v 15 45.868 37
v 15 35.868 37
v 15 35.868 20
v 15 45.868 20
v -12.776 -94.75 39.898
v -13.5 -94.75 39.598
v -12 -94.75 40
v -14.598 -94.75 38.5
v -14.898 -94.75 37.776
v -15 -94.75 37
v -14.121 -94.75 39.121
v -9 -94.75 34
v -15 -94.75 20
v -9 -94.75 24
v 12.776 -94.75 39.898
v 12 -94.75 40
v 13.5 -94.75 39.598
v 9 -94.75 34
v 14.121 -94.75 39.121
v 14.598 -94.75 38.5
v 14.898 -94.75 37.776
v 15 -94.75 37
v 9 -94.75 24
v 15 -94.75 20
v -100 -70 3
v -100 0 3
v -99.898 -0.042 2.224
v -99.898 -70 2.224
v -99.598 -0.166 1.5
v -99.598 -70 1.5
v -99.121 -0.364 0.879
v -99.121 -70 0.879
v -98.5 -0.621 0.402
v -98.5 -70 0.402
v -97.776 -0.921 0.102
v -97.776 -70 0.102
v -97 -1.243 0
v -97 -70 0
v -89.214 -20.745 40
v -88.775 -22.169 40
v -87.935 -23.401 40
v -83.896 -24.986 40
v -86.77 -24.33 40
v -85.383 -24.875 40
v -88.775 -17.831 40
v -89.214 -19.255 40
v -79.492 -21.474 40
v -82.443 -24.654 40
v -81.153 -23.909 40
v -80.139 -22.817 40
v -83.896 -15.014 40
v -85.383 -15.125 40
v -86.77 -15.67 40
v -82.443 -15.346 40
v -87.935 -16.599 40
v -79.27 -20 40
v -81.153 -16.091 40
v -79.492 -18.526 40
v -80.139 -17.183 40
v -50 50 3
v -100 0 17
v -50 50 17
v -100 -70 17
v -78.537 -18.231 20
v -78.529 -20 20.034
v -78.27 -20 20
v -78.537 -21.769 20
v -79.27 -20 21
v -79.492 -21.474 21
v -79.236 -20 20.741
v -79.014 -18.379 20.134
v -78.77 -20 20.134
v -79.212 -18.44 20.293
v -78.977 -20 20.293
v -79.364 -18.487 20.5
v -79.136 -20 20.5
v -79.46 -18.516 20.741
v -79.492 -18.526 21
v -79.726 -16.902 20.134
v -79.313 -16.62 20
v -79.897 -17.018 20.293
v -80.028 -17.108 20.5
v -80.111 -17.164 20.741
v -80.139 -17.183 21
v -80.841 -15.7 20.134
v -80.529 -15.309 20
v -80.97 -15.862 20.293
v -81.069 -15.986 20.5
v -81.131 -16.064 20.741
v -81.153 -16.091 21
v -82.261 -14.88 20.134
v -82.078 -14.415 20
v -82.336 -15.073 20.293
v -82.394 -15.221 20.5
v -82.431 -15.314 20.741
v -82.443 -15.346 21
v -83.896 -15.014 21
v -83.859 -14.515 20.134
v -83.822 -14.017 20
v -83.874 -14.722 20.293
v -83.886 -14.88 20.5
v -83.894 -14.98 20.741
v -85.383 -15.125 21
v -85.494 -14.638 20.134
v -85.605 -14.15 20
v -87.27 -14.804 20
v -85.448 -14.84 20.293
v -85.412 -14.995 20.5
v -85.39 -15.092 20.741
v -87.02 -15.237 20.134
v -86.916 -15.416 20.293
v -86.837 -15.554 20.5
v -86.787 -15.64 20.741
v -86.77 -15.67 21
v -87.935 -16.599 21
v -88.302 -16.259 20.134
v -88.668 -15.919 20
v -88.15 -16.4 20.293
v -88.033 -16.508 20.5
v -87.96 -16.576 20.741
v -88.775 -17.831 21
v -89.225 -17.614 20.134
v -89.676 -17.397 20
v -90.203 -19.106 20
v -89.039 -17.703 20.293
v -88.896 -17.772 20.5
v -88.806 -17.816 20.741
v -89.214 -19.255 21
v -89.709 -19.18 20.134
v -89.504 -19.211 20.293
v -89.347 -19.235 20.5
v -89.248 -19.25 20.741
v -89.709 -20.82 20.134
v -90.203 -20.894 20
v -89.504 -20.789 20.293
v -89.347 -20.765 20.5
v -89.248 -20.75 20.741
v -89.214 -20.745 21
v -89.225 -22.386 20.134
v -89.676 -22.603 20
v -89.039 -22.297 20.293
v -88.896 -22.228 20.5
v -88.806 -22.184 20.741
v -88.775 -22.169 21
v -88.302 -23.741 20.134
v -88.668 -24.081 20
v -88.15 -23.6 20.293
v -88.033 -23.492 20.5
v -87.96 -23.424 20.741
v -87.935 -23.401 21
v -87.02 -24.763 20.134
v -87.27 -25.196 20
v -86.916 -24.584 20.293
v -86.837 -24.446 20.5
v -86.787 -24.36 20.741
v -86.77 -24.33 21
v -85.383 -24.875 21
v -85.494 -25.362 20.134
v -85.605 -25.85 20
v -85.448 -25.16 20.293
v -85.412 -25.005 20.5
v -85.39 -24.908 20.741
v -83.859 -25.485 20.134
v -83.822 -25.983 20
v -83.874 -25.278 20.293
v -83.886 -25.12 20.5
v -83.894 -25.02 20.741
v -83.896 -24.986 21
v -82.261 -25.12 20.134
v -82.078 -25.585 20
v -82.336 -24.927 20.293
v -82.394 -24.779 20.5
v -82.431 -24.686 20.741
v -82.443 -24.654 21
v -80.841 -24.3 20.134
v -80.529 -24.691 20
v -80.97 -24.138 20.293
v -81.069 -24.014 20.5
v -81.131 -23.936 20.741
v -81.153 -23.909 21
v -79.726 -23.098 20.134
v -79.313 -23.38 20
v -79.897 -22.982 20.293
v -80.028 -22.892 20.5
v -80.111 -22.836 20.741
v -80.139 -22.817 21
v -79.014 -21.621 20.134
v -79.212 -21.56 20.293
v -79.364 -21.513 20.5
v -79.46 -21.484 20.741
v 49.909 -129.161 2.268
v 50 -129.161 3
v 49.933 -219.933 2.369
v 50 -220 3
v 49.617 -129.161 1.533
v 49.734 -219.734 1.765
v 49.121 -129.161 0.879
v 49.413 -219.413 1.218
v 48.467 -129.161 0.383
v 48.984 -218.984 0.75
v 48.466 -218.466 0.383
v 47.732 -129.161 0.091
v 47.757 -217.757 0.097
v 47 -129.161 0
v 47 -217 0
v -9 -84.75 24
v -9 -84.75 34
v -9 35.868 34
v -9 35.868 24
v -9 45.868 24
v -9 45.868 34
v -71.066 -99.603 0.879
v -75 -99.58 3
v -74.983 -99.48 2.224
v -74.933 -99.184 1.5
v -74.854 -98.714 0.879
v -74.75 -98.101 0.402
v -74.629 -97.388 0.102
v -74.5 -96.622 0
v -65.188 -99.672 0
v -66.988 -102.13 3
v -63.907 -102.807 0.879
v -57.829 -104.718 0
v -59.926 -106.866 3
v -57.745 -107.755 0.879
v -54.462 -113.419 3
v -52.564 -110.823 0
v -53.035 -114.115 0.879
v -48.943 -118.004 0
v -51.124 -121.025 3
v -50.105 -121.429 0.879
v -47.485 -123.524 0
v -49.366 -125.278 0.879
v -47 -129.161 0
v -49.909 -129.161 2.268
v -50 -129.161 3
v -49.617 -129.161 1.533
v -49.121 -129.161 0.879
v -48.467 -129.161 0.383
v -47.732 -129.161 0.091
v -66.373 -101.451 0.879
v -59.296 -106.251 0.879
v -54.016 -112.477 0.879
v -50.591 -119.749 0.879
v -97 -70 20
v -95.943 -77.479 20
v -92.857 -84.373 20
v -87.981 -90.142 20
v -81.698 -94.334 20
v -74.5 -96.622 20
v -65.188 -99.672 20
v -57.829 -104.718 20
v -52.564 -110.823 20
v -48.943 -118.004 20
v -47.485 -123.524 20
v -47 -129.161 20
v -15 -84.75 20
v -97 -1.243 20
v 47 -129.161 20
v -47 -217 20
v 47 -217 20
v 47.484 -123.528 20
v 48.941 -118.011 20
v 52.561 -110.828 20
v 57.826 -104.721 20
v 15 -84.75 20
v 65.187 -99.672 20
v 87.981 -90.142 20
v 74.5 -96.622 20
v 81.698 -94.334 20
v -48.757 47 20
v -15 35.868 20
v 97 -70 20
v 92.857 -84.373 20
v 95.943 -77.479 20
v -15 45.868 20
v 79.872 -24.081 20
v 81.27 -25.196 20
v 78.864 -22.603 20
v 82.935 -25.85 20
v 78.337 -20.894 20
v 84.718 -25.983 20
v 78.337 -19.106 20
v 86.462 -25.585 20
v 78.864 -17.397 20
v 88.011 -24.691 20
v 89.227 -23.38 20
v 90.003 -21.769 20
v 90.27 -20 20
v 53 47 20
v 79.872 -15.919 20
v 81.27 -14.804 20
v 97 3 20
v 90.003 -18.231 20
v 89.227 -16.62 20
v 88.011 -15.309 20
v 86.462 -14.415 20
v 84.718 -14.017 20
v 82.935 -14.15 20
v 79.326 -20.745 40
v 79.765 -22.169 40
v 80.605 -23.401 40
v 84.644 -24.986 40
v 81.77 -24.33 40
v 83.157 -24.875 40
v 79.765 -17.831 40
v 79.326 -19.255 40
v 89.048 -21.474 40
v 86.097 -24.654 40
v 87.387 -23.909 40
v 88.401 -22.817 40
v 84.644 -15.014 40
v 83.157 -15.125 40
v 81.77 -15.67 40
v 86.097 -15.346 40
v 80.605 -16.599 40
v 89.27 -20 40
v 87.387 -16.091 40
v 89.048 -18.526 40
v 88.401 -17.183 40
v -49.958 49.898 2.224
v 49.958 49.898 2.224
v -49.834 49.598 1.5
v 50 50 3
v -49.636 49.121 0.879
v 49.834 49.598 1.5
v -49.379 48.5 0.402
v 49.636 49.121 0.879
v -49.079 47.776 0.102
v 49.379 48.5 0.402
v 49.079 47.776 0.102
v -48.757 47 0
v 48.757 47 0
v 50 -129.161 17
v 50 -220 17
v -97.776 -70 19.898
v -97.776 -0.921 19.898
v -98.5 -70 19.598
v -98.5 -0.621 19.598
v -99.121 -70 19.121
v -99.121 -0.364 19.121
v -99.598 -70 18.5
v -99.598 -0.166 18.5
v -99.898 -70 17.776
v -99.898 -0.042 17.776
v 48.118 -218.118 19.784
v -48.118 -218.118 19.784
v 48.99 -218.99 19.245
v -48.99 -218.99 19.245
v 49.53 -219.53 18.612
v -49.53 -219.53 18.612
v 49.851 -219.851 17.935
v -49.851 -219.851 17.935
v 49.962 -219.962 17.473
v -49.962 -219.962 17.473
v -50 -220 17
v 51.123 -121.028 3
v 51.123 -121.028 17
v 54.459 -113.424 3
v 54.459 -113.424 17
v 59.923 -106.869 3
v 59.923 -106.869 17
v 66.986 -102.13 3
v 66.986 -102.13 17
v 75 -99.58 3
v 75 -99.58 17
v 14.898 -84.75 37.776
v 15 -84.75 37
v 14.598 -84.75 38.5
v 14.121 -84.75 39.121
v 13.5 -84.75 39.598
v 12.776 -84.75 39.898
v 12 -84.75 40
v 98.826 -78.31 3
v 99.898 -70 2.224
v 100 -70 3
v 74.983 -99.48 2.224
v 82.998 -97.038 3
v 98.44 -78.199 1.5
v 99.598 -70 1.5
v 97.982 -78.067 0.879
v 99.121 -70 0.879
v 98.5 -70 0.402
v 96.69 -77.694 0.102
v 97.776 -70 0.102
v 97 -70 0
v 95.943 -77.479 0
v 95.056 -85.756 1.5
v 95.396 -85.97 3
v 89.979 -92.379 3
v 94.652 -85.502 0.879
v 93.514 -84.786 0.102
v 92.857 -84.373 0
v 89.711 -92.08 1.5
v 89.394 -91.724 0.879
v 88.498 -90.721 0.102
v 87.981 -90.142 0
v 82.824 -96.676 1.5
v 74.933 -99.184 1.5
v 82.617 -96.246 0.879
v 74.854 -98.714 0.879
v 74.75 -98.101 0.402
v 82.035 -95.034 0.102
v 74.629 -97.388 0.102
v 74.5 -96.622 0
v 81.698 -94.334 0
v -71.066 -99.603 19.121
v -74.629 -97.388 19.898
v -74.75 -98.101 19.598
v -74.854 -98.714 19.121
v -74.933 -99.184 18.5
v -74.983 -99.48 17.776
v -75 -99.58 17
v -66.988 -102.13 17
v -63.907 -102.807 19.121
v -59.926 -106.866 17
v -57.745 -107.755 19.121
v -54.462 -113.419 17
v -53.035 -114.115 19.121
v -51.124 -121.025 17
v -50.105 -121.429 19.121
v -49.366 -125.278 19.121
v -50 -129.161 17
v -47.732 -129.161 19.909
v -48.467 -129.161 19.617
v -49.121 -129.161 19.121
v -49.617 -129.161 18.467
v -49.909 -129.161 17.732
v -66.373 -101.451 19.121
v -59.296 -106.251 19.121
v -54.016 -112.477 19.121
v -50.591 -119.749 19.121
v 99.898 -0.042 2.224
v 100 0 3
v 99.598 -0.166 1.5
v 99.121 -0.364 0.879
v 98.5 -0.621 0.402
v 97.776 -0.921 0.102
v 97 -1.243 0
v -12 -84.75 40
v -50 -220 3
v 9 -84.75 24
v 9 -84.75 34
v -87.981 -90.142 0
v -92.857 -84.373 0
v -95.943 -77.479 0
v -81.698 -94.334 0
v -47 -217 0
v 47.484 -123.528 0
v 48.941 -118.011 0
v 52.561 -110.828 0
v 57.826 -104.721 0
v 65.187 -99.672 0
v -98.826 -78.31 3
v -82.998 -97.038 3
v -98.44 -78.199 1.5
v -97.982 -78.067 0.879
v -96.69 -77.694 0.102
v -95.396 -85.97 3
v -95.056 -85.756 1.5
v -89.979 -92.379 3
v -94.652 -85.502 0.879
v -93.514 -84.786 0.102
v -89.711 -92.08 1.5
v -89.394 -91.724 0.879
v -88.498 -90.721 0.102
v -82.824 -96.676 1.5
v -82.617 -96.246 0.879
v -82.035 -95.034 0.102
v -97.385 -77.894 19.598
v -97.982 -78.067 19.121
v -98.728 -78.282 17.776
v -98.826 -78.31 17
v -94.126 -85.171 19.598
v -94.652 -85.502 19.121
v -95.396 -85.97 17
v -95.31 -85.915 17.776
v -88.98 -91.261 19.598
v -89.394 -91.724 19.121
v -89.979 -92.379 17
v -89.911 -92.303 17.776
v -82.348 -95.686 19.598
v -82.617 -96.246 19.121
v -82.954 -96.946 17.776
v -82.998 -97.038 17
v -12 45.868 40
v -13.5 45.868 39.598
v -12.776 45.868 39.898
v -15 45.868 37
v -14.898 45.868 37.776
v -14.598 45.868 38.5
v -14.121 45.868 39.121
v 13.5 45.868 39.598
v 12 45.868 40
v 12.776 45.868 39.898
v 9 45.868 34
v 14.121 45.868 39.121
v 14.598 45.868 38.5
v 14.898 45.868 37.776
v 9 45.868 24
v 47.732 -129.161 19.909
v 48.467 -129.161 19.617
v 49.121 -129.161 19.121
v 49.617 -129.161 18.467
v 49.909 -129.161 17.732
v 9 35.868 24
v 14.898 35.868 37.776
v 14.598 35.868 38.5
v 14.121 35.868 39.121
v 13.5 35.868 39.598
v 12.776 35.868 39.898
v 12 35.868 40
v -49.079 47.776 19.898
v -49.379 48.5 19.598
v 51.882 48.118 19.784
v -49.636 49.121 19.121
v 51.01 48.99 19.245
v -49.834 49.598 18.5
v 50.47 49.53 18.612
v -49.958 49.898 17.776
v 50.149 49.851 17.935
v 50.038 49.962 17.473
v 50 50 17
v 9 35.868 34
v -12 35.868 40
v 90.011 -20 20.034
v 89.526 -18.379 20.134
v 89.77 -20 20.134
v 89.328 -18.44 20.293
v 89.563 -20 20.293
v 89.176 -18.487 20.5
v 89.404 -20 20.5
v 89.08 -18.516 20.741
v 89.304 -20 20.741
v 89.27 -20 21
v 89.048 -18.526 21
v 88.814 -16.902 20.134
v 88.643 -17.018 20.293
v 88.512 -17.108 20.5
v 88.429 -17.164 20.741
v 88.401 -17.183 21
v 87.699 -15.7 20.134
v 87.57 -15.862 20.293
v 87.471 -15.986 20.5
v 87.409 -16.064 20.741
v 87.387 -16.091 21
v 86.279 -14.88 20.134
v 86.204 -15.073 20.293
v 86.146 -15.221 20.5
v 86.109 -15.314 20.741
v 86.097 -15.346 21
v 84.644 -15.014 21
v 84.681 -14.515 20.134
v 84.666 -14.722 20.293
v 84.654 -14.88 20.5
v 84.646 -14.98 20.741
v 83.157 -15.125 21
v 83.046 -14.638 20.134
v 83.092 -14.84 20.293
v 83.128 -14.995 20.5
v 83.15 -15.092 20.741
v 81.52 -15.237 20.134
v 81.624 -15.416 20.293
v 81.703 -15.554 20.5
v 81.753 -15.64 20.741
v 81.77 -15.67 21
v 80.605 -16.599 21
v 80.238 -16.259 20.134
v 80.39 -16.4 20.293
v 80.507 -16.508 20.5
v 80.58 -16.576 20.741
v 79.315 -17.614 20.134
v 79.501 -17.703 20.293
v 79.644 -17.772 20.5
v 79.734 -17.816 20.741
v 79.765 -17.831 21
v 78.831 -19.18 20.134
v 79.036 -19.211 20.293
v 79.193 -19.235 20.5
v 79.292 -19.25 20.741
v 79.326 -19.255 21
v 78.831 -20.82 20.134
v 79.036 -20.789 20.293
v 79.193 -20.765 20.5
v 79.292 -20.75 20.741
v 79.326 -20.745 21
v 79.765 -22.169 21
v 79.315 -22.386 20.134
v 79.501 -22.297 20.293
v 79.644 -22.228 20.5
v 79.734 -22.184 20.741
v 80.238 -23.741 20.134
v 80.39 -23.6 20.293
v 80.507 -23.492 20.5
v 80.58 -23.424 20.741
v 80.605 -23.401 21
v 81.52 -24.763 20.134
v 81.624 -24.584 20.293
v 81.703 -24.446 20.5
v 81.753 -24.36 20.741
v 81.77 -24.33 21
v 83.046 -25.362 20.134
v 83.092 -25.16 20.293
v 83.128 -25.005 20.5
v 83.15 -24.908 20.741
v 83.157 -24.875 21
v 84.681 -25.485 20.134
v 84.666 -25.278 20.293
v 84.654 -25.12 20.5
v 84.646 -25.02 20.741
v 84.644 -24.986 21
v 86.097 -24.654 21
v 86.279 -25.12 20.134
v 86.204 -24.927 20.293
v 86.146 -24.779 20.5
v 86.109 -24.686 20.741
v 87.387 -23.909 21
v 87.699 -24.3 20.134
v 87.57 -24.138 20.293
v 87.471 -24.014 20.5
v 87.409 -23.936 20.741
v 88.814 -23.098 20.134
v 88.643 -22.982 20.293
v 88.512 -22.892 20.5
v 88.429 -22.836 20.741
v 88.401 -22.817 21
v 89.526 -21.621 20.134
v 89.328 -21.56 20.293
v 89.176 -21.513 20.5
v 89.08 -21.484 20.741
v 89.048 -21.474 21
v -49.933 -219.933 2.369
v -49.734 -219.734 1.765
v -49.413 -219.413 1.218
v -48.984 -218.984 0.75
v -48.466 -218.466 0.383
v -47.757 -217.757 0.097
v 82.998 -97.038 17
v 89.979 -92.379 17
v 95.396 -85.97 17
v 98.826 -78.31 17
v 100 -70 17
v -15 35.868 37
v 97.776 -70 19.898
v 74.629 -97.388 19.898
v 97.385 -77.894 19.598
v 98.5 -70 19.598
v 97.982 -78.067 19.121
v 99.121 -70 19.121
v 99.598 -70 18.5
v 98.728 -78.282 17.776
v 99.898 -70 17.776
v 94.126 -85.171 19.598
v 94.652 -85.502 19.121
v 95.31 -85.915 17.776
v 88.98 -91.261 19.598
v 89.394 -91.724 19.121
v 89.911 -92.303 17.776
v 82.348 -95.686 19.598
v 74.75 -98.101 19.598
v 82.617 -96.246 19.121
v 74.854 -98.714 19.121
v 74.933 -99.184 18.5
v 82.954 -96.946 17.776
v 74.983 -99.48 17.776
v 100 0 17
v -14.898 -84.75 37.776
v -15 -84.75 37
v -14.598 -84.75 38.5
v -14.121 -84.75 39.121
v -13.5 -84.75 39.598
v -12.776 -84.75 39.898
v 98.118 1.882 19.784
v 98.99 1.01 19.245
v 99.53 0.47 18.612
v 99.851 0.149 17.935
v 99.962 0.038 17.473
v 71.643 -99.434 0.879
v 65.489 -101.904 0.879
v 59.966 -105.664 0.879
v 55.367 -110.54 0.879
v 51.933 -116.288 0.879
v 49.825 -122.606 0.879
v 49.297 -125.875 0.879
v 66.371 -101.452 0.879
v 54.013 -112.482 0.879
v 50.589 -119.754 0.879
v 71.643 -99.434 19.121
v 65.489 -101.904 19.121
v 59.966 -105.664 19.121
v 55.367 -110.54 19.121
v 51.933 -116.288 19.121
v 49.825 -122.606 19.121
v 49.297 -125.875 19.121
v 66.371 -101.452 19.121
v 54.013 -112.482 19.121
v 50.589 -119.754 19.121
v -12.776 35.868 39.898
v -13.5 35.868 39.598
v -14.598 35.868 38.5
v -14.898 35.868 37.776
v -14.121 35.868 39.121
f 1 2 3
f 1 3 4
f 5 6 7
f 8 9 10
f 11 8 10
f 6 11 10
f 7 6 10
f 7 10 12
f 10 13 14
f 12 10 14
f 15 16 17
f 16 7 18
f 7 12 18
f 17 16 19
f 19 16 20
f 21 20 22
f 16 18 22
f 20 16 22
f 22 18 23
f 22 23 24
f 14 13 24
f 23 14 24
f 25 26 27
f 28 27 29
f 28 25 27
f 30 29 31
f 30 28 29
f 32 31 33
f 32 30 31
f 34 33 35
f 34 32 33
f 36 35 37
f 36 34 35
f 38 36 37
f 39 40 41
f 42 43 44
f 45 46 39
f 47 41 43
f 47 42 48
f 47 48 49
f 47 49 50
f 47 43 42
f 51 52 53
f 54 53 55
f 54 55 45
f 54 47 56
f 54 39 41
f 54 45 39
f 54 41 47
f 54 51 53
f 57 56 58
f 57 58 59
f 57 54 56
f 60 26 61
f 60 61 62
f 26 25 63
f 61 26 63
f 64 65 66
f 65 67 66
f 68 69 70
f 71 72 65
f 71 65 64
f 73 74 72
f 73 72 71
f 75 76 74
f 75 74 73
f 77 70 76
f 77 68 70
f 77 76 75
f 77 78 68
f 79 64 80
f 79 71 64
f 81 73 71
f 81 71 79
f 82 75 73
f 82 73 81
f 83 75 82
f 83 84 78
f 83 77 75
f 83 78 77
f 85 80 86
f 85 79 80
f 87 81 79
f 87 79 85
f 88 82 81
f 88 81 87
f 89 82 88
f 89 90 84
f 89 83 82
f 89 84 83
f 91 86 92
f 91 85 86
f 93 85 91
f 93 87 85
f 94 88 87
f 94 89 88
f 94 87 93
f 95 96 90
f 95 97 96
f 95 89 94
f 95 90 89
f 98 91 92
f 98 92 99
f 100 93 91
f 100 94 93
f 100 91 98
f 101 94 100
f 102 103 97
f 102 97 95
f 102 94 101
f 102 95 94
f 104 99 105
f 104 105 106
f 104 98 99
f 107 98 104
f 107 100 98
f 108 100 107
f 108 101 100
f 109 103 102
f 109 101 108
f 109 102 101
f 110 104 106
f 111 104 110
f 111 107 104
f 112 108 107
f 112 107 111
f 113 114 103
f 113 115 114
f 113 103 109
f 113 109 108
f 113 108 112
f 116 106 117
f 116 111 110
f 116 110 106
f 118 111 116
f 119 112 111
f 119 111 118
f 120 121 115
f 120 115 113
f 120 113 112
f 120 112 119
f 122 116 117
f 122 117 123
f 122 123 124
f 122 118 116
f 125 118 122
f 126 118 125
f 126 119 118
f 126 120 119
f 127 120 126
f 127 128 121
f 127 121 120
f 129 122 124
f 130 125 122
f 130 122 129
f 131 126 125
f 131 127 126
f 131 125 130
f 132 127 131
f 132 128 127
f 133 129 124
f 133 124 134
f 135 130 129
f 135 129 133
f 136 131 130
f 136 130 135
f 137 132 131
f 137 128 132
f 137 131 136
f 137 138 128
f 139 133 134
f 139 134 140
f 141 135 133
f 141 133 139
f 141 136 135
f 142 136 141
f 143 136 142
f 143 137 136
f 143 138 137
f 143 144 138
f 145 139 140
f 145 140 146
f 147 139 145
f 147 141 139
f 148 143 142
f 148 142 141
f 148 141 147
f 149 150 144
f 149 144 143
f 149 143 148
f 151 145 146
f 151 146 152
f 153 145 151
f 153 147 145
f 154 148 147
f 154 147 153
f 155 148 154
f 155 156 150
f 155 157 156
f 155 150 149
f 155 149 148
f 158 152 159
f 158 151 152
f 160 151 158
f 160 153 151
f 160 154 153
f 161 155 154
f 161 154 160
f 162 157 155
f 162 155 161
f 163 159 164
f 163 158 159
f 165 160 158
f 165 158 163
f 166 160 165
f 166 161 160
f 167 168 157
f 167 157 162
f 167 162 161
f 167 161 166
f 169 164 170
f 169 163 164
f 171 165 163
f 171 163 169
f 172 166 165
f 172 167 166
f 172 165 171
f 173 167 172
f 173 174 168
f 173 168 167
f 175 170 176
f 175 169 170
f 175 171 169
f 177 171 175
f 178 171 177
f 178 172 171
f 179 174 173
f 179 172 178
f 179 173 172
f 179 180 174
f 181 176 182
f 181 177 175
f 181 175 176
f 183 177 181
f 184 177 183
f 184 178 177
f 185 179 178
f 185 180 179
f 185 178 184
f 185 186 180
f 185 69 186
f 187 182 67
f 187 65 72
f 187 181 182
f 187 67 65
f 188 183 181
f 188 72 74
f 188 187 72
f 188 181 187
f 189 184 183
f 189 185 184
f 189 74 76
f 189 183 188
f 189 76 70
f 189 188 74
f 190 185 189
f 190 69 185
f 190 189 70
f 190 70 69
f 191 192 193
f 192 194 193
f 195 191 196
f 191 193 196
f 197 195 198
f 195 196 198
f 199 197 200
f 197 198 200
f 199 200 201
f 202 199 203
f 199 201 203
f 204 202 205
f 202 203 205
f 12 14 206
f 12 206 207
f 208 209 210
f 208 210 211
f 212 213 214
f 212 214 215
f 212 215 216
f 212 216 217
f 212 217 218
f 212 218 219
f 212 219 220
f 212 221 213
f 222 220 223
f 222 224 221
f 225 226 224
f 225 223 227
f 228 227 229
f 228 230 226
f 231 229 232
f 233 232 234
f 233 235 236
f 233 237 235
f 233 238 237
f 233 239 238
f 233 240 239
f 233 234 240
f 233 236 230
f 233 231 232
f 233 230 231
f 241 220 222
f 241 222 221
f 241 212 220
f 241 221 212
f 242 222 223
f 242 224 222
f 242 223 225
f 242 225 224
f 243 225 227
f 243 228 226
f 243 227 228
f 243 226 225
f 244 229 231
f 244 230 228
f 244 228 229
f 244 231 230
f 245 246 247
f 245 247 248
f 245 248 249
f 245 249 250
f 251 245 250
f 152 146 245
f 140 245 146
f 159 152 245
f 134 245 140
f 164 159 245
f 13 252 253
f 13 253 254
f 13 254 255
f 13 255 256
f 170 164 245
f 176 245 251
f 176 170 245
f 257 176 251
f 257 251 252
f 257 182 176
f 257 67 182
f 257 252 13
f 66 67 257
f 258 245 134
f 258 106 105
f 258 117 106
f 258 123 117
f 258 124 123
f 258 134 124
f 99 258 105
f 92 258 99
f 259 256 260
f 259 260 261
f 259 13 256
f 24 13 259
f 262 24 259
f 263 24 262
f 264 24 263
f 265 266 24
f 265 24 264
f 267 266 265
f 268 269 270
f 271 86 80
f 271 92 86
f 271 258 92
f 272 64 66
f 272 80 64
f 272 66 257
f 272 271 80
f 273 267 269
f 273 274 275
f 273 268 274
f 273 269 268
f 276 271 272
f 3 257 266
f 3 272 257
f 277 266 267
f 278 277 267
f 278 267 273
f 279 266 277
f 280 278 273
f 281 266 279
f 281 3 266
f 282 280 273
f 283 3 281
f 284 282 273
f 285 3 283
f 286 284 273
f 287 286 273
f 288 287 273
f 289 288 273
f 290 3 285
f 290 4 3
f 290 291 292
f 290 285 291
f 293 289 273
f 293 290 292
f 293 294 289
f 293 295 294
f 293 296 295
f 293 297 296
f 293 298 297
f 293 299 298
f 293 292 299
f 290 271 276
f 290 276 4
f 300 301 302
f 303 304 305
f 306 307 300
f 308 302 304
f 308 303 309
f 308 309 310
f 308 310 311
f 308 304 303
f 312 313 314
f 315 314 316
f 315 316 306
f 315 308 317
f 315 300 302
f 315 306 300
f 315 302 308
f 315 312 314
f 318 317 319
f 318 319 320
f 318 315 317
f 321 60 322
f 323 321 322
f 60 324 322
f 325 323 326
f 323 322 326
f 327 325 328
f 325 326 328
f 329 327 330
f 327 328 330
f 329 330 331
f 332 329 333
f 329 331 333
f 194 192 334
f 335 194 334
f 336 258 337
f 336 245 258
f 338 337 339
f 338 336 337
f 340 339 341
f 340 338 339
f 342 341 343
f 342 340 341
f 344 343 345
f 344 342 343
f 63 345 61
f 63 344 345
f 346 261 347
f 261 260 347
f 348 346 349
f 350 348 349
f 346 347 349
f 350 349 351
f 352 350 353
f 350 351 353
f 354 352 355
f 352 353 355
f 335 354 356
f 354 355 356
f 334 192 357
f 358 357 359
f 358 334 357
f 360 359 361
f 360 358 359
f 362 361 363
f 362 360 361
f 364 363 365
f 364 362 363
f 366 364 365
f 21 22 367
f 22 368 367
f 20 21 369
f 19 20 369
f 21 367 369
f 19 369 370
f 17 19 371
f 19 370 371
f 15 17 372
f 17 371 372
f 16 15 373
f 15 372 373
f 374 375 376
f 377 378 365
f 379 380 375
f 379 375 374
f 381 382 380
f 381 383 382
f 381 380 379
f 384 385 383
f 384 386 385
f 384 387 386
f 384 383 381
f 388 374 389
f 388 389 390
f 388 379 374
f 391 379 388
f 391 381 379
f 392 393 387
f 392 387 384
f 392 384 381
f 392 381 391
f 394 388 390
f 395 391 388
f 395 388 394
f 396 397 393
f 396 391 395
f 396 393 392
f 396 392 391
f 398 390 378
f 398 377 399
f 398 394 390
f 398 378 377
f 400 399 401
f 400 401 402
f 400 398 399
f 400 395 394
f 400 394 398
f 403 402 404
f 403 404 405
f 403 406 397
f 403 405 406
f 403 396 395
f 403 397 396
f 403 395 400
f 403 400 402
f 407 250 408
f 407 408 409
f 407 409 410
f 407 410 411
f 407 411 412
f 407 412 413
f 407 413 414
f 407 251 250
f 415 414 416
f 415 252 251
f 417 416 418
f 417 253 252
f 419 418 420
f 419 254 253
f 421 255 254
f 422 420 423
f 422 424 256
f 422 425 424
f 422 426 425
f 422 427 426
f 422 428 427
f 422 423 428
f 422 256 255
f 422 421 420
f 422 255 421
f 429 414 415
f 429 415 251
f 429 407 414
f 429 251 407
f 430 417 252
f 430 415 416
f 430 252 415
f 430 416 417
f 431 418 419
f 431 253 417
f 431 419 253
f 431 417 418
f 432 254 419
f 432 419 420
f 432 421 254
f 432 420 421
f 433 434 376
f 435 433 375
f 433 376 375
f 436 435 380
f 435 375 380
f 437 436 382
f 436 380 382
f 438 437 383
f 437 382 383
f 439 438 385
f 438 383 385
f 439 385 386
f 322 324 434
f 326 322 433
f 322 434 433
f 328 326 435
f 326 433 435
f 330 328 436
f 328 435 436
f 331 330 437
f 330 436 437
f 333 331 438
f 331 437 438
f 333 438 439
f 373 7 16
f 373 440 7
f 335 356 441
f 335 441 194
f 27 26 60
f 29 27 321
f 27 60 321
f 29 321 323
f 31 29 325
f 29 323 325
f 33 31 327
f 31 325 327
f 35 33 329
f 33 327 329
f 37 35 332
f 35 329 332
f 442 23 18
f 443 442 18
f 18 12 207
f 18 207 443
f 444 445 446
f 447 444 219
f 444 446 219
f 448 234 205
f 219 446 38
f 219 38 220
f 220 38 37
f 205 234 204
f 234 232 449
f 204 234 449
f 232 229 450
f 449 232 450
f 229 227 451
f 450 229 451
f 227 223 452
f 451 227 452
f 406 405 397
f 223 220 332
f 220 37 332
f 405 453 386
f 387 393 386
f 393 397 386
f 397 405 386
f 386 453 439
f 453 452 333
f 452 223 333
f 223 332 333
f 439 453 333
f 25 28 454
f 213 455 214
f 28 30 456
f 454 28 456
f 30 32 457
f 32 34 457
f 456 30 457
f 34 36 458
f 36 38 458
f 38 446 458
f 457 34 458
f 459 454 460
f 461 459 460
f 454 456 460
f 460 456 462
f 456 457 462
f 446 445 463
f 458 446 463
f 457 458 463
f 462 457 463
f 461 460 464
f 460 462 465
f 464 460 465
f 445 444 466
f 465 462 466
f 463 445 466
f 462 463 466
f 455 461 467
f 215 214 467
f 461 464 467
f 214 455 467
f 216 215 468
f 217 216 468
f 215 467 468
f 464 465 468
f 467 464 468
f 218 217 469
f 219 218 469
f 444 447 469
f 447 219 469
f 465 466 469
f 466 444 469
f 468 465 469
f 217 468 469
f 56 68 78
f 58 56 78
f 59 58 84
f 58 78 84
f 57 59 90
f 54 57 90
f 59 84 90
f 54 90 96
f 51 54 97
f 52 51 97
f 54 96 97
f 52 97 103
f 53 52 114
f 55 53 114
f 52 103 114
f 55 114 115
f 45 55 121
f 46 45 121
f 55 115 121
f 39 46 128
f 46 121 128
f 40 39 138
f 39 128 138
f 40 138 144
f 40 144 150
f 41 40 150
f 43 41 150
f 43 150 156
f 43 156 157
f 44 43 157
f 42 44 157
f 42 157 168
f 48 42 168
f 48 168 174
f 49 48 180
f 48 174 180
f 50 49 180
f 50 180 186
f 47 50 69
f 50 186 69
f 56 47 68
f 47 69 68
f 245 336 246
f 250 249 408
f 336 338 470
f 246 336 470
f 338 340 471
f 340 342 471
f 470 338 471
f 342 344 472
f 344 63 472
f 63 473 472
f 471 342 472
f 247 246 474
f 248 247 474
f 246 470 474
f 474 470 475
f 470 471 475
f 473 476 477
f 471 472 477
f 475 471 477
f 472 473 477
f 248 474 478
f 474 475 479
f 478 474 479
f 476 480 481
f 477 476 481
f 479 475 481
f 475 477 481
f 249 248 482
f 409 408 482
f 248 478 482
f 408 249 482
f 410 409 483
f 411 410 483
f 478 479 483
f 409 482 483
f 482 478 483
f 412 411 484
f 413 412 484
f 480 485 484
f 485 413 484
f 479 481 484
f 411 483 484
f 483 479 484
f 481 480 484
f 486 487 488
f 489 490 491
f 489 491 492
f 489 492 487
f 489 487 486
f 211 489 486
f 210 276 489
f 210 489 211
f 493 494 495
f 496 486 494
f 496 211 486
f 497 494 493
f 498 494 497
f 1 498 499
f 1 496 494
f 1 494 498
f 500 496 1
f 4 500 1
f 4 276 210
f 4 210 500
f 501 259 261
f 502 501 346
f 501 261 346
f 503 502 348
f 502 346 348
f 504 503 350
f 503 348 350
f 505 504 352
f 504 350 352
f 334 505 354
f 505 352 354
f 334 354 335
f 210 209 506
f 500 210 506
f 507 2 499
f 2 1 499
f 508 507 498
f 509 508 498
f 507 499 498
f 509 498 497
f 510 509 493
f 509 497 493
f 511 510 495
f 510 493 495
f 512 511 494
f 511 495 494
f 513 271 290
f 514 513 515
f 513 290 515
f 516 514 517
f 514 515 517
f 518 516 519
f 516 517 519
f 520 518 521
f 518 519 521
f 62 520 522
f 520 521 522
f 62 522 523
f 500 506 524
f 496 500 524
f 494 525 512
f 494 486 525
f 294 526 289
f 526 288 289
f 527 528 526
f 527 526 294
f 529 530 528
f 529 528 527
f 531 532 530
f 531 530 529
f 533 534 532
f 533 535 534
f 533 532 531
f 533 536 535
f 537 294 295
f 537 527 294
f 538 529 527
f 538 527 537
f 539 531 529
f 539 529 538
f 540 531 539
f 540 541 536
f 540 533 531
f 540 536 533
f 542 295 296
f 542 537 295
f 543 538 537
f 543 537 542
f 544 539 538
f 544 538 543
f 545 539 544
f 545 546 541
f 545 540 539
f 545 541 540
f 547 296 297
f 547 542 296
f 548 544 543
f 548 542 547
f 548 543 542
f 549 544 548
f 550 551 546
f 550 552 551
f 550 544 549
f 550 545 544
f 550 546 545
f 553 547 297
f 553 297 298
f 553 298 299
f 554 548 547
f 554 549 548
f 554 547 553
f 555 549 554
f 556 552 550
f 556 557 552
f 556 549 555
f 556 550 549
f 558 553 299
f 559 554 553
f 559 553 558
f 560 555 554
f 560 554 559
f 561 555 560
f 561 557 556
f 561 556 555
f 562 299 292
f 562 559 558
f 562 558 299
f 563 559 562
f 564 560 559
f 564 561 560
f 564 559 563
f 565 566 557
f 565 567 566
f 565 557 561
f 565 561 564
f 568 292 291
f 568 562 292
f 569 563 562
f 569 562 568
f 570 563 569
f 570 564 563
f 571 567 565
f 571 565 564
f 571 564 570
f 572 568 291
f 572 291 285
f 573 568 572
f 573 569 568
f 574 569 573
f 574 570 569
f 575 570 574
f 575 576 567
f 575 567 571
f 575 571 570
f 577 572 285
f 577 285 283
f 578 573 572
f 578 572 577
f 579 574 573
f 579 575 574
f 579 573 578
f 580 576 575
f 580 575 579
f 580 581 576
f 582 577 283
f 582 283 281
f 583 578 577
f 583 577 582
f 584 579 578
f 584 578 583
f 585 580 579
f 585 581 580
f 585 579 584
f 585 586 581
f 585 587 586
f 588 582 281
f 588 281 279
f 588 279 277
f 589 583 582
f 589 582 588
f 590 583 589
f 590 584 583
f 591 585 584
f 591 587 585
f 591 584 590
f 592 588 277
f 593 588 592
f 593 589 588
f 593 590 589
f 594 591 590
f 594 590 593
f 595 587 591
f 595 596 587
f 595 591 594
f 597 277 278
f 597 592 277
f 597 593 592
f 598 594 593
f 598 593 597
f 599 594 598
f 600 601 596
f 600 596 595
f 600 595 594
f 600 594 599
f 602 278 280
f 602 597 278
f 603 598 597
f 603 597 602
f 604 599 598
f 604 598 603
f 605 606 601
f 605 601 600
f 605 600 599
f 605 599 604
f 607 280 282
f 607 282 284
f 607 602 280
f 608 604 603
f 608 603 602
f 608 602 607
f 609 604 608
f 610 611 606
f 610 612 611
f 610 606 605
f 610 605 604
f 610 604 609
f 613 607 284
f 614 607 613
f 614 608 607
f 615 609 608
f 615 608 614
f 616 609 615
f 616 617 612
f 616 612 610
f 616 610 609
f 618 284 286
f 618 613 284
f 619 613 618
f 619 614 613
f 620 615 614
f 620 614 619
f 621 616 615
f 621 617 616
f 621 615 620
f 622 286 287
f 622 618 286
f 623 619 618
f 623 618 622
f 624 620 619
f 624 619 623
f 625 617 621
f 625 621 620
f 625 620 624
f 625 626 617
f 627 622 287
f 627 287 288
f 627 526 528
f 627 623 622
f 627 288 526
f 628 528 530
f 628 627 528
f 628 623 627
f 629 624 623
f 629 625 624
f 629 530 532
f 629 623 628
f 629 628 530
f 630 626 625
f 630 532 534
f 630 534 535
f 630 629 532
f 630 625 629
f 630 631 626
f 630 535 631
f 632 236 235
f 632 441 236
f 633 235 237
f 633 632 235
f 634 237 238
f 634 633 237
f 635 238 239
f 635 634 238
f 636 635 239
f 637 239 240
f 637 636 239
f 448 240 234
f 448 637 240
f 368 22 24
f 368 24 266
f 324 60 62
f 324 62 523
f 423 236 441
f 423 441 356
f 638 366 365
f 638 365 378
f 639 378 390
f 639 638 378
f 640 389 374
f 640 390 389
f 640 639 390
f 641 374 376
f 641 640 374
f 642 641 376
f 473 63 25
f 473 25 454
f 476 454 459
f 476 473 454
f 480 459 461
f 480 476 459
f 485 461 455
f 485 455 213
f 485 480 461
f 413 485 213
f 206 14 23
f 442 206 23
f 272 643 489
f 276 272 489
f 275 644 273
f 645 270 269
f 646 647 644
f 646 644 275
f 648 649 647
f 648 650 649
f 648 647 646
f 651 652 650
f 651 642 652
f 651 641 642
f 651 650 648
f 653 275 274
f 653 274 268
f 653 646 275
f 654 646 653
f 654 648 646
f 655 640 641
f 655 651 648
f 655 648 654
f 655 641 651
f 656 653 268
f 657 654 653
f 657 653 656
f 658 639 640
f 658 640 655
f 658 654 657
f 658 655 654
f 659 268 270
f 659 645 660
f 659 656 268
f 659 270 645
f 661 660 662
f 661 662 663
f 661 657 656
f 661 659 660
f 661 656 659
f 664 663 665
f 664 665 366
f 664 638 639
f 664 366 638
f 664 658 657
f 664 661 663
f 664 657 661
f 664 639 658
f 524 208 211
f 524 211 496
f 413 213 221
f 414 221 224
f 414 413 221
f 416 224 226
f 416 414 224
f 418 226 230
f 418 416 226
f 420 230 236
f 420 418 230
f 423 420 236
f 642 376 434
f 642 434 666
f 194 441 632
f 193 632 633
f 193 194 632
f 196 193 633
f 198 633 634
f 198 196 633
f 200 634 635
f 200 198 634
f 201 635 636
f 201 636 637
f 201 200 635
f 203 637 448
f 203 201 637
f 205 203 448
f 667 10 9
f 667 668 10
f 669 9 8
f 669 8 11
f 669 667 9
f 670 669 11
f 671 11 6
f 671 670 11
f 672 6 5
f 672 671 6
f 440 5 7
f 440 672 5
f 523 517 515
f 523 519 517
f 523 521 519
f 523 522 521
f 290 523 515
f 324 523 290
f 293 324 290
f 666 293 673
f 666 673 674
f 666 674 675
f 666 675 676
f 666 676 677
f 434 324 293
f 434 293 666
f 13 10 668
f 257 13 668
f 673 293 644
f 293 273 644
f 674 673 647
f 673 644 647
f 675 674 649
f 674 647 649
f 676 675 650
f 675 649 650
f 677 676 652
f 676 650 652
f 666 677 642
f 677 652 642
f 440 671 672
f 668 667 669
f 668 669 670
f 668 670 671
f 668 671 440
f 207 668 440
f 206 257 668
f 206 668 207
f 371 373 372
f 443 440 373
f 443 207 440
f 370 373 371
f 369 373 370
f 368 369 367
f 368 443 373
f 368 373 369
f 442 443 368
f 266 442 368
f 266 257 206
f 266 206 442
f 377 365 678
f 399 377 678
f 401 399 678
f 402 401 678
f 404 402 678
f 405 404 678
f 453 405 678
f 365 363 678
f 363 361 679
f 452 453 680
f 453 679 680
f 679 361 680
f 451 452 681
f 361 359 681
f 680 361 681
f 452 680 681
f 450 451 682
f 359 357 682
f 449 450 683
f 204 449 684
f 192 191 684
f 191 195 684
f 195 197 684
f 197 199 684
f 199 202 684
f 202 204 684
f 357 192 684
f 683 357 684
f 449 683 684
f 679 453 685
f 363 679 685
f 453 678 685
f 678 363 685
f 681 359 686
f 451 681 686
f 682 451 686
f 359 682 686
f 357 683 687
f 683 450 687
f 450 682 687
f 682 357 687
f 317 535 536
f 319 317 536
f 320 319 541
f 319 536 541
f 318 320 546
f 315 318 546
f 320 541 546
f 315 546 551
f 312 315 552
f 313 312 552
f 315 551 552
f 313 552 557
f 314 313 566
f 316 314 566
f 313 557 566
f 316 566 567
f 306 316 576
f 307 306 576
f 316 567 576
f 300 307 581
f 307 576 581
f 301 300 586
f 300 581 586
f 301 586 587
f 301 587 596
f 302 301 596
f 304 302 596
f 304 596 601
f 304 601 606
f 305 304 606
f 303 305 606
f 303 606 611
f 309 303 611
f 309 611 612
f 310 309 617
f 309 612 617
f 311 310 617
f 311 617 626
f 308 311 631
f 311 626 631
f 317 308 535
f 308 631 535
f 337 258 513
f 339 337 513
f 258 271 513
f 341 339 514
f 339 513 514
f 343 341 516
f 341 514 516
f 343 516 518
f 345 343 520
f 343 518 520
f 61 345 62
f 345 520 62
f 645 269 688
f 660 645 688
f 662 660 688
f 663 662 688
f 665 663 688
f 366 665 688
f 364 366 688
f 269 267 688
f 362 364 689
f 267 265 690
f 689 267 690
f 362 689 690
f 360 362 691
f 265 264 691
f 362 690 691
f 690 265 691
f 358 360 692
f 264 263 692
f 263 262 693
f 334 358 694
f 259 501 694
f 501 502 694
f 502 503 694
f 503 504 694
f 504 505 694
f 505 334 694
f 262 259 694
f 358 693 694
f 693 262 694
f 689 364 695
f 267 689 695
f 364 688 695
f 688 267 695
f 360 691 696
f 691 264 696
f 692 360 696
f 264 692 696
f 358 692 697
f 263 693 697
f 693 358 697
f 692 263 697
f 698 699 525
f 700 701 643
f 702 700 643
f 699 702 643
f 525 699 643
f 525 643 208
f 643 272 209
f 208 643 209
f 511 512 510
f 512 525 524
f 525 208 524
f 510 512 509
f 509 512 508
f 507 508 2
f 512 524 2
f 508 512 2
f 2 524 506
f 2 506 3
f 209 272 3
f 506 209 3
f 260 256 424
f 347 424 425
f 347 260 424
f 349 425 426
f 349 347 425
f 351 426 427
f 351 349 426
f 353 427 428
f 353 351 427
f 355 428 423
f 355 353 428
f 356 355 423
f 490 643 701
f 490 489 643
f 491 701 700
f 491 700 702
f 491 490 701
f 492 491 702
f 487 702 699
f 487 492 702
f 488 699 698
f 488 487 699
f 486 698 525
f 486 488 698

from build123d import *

# Parameters (mm, degrees)
BOSS_EXTRUDE1_DEPTH = 20
SKETCH2_R           = 5
BOSS_EXTRUDE2_DEPTH = 20
SKETCH3_W           = 200
SKETCH3_H           = 20
BOSS_EXTRUDE3_DEPTH = 50
SKETCH4_W           = 30
SKETCH4_H           = 10
BOSS_EXTRUDE4_DEPTH = 20
SKETCH5_W           = 18
SKETCH5_H           = 10
CUT_EXTRUDE1_DEPTH  = 145.75
SKETCH6_W           = 50
SKETCH6_H           = 20
BOSS_EXTRUDE5_DEPTH = 120
FILLET1_R           = 30
FILLET2_R           = 30
FILLET3_R           = 3
FILLET4_R           = 1


with BuildPart() as part:
    # Sketch1 → Boss-Extrude1 (new body)
    with BuildSketch(Plane.XY):
        Polygon((-100, 0), (-50, 50), (50, 50), (100, 0), (100, -50), (-100, -50), align=None)
    extrude(amount=BOSS_EXTRUDE1_DEPTH)

    # Sketch2 → Boss-Extrude2 (add)
    with BuildSketch(Plane.XY.offset(20)):
        with Locations((-84.27, -20)):
            Circle(SKETCH2_R)
        with Locations((84.27, -20)):
            Circle(SKETCH2_R)
    extrude(amount=BOSS_EXTRUDE2_DEPTH)

    # Sketch3 → Boss-Extrude3 (add)
    with BuildSketch(Plane.XZ.offset(50)):
        with Locations((0, 10)):
            Rectangle(SKETCH3_W, SKETCH3_H)
    extrude(amount=BOSS_EXTRUDE3_DEPTH)

    # Sketch4 → Boss-Extrude4 (add)
    with BuildSketch(Plane.XY.offset(20)):
        with Locations((0, -89.75)):
            Rectangle(SKETCH4_W, SKETCH4_H)
        with Locations((0, 40.86768586)):
            Rectangle(SKETCH4_W, SKETCH4_H)
    extrude(amount=BOSS_EXTRUDE4_DEPTH)

    # Sketch5 → Cut-Extrude1 (cut, through all)
    with BuildSketch(Plane.XZ.offset(94.75)):
        with Locations((0, 29)):
            Rectangle(SKETCH5_W, SKETCH5_H)
    extrude(amount=-CUT_EXTRUDE1_DEPTH, mode=Mode.SUBTRACT)

    # Sketch6 → Boss-Extrude5 (add)
    with BuildSketch(Plane.XZ.offset(100)):
        with Locations((-25, 10)):
            Rectangle(SKETCH6_W, SKETCH6_H)
        with Locations((25, 10)):
            Rectangle(SKETCH6_W, SKETCH6_H)
    extrude(amount=BOSS_EXTRUDE5_DEPTH)

    # Fillet1
    fillet1_edges = [part.edges().sort_by_distance(p)[0] for p in [
        (-100, -100, 10),
        (100, -100, 10),
    ]]
    fillet(fillet1_edges, radius=FILLET1_R)

    # Fillet2
    fillet2_edges = [part.edges().sort_by_distance(p)[0] for p in [
        (-50, -100, 10),
        (50, -100, 10),
    ]]
    fillet(fillet2_edges, radius=FILLET2_R)

    # Fillet3
    fillet3_edges = [part.edges().sort_by_distance(p)[0] for p in [
        (-50, -174.580398915, 20),
        (-50, -174.580398915, 0),
        (50, -174.580398915, 0),
        (50, -174.580398915, 20),
        (0, -220, 0),
        (0, -220, 20),
        (100, -35, 0),
        (92.912878475, -89.364916731, 0),
        (100, -35, 20),
        (-92.912878475, -89.364916731, 20),
        (0, 50, 20),
        (-92.912878475, -89.364916731, 0),
        (92.912878475, -89.364916731, 20),
        (-57.087121525, -109.7958811, 20),
        (-57.087121525, -109.7958811, 0),
        (57.087121525, -109.7958811, 0),
        (57.087121525, -109.7958811, 20),
        (-75, 25, 20),
        (-100, -35, 20),
        (15, -89.75, 40),
        (-15, -89.75, 40),
        (-15, 40.86768586, 40),
        (15, 40.86768586, 40),
        (-100, -35, 0),
        (-75, 25, 0),
        (0, 50, 0),
        (75, 25, 0),
    ]]
    fillet(fillet3_edges, radius=FILLET3_R)

    # Fillet4
    fillet4_edges = [part.edges().sort_by_distance(p)[0] for p in [
        (-89.27, -20, 20),
        (79.27, -20, 20),
    ]]
    fillet(fillet4_edges, radius=FILLET4_R)


solid = part.part
